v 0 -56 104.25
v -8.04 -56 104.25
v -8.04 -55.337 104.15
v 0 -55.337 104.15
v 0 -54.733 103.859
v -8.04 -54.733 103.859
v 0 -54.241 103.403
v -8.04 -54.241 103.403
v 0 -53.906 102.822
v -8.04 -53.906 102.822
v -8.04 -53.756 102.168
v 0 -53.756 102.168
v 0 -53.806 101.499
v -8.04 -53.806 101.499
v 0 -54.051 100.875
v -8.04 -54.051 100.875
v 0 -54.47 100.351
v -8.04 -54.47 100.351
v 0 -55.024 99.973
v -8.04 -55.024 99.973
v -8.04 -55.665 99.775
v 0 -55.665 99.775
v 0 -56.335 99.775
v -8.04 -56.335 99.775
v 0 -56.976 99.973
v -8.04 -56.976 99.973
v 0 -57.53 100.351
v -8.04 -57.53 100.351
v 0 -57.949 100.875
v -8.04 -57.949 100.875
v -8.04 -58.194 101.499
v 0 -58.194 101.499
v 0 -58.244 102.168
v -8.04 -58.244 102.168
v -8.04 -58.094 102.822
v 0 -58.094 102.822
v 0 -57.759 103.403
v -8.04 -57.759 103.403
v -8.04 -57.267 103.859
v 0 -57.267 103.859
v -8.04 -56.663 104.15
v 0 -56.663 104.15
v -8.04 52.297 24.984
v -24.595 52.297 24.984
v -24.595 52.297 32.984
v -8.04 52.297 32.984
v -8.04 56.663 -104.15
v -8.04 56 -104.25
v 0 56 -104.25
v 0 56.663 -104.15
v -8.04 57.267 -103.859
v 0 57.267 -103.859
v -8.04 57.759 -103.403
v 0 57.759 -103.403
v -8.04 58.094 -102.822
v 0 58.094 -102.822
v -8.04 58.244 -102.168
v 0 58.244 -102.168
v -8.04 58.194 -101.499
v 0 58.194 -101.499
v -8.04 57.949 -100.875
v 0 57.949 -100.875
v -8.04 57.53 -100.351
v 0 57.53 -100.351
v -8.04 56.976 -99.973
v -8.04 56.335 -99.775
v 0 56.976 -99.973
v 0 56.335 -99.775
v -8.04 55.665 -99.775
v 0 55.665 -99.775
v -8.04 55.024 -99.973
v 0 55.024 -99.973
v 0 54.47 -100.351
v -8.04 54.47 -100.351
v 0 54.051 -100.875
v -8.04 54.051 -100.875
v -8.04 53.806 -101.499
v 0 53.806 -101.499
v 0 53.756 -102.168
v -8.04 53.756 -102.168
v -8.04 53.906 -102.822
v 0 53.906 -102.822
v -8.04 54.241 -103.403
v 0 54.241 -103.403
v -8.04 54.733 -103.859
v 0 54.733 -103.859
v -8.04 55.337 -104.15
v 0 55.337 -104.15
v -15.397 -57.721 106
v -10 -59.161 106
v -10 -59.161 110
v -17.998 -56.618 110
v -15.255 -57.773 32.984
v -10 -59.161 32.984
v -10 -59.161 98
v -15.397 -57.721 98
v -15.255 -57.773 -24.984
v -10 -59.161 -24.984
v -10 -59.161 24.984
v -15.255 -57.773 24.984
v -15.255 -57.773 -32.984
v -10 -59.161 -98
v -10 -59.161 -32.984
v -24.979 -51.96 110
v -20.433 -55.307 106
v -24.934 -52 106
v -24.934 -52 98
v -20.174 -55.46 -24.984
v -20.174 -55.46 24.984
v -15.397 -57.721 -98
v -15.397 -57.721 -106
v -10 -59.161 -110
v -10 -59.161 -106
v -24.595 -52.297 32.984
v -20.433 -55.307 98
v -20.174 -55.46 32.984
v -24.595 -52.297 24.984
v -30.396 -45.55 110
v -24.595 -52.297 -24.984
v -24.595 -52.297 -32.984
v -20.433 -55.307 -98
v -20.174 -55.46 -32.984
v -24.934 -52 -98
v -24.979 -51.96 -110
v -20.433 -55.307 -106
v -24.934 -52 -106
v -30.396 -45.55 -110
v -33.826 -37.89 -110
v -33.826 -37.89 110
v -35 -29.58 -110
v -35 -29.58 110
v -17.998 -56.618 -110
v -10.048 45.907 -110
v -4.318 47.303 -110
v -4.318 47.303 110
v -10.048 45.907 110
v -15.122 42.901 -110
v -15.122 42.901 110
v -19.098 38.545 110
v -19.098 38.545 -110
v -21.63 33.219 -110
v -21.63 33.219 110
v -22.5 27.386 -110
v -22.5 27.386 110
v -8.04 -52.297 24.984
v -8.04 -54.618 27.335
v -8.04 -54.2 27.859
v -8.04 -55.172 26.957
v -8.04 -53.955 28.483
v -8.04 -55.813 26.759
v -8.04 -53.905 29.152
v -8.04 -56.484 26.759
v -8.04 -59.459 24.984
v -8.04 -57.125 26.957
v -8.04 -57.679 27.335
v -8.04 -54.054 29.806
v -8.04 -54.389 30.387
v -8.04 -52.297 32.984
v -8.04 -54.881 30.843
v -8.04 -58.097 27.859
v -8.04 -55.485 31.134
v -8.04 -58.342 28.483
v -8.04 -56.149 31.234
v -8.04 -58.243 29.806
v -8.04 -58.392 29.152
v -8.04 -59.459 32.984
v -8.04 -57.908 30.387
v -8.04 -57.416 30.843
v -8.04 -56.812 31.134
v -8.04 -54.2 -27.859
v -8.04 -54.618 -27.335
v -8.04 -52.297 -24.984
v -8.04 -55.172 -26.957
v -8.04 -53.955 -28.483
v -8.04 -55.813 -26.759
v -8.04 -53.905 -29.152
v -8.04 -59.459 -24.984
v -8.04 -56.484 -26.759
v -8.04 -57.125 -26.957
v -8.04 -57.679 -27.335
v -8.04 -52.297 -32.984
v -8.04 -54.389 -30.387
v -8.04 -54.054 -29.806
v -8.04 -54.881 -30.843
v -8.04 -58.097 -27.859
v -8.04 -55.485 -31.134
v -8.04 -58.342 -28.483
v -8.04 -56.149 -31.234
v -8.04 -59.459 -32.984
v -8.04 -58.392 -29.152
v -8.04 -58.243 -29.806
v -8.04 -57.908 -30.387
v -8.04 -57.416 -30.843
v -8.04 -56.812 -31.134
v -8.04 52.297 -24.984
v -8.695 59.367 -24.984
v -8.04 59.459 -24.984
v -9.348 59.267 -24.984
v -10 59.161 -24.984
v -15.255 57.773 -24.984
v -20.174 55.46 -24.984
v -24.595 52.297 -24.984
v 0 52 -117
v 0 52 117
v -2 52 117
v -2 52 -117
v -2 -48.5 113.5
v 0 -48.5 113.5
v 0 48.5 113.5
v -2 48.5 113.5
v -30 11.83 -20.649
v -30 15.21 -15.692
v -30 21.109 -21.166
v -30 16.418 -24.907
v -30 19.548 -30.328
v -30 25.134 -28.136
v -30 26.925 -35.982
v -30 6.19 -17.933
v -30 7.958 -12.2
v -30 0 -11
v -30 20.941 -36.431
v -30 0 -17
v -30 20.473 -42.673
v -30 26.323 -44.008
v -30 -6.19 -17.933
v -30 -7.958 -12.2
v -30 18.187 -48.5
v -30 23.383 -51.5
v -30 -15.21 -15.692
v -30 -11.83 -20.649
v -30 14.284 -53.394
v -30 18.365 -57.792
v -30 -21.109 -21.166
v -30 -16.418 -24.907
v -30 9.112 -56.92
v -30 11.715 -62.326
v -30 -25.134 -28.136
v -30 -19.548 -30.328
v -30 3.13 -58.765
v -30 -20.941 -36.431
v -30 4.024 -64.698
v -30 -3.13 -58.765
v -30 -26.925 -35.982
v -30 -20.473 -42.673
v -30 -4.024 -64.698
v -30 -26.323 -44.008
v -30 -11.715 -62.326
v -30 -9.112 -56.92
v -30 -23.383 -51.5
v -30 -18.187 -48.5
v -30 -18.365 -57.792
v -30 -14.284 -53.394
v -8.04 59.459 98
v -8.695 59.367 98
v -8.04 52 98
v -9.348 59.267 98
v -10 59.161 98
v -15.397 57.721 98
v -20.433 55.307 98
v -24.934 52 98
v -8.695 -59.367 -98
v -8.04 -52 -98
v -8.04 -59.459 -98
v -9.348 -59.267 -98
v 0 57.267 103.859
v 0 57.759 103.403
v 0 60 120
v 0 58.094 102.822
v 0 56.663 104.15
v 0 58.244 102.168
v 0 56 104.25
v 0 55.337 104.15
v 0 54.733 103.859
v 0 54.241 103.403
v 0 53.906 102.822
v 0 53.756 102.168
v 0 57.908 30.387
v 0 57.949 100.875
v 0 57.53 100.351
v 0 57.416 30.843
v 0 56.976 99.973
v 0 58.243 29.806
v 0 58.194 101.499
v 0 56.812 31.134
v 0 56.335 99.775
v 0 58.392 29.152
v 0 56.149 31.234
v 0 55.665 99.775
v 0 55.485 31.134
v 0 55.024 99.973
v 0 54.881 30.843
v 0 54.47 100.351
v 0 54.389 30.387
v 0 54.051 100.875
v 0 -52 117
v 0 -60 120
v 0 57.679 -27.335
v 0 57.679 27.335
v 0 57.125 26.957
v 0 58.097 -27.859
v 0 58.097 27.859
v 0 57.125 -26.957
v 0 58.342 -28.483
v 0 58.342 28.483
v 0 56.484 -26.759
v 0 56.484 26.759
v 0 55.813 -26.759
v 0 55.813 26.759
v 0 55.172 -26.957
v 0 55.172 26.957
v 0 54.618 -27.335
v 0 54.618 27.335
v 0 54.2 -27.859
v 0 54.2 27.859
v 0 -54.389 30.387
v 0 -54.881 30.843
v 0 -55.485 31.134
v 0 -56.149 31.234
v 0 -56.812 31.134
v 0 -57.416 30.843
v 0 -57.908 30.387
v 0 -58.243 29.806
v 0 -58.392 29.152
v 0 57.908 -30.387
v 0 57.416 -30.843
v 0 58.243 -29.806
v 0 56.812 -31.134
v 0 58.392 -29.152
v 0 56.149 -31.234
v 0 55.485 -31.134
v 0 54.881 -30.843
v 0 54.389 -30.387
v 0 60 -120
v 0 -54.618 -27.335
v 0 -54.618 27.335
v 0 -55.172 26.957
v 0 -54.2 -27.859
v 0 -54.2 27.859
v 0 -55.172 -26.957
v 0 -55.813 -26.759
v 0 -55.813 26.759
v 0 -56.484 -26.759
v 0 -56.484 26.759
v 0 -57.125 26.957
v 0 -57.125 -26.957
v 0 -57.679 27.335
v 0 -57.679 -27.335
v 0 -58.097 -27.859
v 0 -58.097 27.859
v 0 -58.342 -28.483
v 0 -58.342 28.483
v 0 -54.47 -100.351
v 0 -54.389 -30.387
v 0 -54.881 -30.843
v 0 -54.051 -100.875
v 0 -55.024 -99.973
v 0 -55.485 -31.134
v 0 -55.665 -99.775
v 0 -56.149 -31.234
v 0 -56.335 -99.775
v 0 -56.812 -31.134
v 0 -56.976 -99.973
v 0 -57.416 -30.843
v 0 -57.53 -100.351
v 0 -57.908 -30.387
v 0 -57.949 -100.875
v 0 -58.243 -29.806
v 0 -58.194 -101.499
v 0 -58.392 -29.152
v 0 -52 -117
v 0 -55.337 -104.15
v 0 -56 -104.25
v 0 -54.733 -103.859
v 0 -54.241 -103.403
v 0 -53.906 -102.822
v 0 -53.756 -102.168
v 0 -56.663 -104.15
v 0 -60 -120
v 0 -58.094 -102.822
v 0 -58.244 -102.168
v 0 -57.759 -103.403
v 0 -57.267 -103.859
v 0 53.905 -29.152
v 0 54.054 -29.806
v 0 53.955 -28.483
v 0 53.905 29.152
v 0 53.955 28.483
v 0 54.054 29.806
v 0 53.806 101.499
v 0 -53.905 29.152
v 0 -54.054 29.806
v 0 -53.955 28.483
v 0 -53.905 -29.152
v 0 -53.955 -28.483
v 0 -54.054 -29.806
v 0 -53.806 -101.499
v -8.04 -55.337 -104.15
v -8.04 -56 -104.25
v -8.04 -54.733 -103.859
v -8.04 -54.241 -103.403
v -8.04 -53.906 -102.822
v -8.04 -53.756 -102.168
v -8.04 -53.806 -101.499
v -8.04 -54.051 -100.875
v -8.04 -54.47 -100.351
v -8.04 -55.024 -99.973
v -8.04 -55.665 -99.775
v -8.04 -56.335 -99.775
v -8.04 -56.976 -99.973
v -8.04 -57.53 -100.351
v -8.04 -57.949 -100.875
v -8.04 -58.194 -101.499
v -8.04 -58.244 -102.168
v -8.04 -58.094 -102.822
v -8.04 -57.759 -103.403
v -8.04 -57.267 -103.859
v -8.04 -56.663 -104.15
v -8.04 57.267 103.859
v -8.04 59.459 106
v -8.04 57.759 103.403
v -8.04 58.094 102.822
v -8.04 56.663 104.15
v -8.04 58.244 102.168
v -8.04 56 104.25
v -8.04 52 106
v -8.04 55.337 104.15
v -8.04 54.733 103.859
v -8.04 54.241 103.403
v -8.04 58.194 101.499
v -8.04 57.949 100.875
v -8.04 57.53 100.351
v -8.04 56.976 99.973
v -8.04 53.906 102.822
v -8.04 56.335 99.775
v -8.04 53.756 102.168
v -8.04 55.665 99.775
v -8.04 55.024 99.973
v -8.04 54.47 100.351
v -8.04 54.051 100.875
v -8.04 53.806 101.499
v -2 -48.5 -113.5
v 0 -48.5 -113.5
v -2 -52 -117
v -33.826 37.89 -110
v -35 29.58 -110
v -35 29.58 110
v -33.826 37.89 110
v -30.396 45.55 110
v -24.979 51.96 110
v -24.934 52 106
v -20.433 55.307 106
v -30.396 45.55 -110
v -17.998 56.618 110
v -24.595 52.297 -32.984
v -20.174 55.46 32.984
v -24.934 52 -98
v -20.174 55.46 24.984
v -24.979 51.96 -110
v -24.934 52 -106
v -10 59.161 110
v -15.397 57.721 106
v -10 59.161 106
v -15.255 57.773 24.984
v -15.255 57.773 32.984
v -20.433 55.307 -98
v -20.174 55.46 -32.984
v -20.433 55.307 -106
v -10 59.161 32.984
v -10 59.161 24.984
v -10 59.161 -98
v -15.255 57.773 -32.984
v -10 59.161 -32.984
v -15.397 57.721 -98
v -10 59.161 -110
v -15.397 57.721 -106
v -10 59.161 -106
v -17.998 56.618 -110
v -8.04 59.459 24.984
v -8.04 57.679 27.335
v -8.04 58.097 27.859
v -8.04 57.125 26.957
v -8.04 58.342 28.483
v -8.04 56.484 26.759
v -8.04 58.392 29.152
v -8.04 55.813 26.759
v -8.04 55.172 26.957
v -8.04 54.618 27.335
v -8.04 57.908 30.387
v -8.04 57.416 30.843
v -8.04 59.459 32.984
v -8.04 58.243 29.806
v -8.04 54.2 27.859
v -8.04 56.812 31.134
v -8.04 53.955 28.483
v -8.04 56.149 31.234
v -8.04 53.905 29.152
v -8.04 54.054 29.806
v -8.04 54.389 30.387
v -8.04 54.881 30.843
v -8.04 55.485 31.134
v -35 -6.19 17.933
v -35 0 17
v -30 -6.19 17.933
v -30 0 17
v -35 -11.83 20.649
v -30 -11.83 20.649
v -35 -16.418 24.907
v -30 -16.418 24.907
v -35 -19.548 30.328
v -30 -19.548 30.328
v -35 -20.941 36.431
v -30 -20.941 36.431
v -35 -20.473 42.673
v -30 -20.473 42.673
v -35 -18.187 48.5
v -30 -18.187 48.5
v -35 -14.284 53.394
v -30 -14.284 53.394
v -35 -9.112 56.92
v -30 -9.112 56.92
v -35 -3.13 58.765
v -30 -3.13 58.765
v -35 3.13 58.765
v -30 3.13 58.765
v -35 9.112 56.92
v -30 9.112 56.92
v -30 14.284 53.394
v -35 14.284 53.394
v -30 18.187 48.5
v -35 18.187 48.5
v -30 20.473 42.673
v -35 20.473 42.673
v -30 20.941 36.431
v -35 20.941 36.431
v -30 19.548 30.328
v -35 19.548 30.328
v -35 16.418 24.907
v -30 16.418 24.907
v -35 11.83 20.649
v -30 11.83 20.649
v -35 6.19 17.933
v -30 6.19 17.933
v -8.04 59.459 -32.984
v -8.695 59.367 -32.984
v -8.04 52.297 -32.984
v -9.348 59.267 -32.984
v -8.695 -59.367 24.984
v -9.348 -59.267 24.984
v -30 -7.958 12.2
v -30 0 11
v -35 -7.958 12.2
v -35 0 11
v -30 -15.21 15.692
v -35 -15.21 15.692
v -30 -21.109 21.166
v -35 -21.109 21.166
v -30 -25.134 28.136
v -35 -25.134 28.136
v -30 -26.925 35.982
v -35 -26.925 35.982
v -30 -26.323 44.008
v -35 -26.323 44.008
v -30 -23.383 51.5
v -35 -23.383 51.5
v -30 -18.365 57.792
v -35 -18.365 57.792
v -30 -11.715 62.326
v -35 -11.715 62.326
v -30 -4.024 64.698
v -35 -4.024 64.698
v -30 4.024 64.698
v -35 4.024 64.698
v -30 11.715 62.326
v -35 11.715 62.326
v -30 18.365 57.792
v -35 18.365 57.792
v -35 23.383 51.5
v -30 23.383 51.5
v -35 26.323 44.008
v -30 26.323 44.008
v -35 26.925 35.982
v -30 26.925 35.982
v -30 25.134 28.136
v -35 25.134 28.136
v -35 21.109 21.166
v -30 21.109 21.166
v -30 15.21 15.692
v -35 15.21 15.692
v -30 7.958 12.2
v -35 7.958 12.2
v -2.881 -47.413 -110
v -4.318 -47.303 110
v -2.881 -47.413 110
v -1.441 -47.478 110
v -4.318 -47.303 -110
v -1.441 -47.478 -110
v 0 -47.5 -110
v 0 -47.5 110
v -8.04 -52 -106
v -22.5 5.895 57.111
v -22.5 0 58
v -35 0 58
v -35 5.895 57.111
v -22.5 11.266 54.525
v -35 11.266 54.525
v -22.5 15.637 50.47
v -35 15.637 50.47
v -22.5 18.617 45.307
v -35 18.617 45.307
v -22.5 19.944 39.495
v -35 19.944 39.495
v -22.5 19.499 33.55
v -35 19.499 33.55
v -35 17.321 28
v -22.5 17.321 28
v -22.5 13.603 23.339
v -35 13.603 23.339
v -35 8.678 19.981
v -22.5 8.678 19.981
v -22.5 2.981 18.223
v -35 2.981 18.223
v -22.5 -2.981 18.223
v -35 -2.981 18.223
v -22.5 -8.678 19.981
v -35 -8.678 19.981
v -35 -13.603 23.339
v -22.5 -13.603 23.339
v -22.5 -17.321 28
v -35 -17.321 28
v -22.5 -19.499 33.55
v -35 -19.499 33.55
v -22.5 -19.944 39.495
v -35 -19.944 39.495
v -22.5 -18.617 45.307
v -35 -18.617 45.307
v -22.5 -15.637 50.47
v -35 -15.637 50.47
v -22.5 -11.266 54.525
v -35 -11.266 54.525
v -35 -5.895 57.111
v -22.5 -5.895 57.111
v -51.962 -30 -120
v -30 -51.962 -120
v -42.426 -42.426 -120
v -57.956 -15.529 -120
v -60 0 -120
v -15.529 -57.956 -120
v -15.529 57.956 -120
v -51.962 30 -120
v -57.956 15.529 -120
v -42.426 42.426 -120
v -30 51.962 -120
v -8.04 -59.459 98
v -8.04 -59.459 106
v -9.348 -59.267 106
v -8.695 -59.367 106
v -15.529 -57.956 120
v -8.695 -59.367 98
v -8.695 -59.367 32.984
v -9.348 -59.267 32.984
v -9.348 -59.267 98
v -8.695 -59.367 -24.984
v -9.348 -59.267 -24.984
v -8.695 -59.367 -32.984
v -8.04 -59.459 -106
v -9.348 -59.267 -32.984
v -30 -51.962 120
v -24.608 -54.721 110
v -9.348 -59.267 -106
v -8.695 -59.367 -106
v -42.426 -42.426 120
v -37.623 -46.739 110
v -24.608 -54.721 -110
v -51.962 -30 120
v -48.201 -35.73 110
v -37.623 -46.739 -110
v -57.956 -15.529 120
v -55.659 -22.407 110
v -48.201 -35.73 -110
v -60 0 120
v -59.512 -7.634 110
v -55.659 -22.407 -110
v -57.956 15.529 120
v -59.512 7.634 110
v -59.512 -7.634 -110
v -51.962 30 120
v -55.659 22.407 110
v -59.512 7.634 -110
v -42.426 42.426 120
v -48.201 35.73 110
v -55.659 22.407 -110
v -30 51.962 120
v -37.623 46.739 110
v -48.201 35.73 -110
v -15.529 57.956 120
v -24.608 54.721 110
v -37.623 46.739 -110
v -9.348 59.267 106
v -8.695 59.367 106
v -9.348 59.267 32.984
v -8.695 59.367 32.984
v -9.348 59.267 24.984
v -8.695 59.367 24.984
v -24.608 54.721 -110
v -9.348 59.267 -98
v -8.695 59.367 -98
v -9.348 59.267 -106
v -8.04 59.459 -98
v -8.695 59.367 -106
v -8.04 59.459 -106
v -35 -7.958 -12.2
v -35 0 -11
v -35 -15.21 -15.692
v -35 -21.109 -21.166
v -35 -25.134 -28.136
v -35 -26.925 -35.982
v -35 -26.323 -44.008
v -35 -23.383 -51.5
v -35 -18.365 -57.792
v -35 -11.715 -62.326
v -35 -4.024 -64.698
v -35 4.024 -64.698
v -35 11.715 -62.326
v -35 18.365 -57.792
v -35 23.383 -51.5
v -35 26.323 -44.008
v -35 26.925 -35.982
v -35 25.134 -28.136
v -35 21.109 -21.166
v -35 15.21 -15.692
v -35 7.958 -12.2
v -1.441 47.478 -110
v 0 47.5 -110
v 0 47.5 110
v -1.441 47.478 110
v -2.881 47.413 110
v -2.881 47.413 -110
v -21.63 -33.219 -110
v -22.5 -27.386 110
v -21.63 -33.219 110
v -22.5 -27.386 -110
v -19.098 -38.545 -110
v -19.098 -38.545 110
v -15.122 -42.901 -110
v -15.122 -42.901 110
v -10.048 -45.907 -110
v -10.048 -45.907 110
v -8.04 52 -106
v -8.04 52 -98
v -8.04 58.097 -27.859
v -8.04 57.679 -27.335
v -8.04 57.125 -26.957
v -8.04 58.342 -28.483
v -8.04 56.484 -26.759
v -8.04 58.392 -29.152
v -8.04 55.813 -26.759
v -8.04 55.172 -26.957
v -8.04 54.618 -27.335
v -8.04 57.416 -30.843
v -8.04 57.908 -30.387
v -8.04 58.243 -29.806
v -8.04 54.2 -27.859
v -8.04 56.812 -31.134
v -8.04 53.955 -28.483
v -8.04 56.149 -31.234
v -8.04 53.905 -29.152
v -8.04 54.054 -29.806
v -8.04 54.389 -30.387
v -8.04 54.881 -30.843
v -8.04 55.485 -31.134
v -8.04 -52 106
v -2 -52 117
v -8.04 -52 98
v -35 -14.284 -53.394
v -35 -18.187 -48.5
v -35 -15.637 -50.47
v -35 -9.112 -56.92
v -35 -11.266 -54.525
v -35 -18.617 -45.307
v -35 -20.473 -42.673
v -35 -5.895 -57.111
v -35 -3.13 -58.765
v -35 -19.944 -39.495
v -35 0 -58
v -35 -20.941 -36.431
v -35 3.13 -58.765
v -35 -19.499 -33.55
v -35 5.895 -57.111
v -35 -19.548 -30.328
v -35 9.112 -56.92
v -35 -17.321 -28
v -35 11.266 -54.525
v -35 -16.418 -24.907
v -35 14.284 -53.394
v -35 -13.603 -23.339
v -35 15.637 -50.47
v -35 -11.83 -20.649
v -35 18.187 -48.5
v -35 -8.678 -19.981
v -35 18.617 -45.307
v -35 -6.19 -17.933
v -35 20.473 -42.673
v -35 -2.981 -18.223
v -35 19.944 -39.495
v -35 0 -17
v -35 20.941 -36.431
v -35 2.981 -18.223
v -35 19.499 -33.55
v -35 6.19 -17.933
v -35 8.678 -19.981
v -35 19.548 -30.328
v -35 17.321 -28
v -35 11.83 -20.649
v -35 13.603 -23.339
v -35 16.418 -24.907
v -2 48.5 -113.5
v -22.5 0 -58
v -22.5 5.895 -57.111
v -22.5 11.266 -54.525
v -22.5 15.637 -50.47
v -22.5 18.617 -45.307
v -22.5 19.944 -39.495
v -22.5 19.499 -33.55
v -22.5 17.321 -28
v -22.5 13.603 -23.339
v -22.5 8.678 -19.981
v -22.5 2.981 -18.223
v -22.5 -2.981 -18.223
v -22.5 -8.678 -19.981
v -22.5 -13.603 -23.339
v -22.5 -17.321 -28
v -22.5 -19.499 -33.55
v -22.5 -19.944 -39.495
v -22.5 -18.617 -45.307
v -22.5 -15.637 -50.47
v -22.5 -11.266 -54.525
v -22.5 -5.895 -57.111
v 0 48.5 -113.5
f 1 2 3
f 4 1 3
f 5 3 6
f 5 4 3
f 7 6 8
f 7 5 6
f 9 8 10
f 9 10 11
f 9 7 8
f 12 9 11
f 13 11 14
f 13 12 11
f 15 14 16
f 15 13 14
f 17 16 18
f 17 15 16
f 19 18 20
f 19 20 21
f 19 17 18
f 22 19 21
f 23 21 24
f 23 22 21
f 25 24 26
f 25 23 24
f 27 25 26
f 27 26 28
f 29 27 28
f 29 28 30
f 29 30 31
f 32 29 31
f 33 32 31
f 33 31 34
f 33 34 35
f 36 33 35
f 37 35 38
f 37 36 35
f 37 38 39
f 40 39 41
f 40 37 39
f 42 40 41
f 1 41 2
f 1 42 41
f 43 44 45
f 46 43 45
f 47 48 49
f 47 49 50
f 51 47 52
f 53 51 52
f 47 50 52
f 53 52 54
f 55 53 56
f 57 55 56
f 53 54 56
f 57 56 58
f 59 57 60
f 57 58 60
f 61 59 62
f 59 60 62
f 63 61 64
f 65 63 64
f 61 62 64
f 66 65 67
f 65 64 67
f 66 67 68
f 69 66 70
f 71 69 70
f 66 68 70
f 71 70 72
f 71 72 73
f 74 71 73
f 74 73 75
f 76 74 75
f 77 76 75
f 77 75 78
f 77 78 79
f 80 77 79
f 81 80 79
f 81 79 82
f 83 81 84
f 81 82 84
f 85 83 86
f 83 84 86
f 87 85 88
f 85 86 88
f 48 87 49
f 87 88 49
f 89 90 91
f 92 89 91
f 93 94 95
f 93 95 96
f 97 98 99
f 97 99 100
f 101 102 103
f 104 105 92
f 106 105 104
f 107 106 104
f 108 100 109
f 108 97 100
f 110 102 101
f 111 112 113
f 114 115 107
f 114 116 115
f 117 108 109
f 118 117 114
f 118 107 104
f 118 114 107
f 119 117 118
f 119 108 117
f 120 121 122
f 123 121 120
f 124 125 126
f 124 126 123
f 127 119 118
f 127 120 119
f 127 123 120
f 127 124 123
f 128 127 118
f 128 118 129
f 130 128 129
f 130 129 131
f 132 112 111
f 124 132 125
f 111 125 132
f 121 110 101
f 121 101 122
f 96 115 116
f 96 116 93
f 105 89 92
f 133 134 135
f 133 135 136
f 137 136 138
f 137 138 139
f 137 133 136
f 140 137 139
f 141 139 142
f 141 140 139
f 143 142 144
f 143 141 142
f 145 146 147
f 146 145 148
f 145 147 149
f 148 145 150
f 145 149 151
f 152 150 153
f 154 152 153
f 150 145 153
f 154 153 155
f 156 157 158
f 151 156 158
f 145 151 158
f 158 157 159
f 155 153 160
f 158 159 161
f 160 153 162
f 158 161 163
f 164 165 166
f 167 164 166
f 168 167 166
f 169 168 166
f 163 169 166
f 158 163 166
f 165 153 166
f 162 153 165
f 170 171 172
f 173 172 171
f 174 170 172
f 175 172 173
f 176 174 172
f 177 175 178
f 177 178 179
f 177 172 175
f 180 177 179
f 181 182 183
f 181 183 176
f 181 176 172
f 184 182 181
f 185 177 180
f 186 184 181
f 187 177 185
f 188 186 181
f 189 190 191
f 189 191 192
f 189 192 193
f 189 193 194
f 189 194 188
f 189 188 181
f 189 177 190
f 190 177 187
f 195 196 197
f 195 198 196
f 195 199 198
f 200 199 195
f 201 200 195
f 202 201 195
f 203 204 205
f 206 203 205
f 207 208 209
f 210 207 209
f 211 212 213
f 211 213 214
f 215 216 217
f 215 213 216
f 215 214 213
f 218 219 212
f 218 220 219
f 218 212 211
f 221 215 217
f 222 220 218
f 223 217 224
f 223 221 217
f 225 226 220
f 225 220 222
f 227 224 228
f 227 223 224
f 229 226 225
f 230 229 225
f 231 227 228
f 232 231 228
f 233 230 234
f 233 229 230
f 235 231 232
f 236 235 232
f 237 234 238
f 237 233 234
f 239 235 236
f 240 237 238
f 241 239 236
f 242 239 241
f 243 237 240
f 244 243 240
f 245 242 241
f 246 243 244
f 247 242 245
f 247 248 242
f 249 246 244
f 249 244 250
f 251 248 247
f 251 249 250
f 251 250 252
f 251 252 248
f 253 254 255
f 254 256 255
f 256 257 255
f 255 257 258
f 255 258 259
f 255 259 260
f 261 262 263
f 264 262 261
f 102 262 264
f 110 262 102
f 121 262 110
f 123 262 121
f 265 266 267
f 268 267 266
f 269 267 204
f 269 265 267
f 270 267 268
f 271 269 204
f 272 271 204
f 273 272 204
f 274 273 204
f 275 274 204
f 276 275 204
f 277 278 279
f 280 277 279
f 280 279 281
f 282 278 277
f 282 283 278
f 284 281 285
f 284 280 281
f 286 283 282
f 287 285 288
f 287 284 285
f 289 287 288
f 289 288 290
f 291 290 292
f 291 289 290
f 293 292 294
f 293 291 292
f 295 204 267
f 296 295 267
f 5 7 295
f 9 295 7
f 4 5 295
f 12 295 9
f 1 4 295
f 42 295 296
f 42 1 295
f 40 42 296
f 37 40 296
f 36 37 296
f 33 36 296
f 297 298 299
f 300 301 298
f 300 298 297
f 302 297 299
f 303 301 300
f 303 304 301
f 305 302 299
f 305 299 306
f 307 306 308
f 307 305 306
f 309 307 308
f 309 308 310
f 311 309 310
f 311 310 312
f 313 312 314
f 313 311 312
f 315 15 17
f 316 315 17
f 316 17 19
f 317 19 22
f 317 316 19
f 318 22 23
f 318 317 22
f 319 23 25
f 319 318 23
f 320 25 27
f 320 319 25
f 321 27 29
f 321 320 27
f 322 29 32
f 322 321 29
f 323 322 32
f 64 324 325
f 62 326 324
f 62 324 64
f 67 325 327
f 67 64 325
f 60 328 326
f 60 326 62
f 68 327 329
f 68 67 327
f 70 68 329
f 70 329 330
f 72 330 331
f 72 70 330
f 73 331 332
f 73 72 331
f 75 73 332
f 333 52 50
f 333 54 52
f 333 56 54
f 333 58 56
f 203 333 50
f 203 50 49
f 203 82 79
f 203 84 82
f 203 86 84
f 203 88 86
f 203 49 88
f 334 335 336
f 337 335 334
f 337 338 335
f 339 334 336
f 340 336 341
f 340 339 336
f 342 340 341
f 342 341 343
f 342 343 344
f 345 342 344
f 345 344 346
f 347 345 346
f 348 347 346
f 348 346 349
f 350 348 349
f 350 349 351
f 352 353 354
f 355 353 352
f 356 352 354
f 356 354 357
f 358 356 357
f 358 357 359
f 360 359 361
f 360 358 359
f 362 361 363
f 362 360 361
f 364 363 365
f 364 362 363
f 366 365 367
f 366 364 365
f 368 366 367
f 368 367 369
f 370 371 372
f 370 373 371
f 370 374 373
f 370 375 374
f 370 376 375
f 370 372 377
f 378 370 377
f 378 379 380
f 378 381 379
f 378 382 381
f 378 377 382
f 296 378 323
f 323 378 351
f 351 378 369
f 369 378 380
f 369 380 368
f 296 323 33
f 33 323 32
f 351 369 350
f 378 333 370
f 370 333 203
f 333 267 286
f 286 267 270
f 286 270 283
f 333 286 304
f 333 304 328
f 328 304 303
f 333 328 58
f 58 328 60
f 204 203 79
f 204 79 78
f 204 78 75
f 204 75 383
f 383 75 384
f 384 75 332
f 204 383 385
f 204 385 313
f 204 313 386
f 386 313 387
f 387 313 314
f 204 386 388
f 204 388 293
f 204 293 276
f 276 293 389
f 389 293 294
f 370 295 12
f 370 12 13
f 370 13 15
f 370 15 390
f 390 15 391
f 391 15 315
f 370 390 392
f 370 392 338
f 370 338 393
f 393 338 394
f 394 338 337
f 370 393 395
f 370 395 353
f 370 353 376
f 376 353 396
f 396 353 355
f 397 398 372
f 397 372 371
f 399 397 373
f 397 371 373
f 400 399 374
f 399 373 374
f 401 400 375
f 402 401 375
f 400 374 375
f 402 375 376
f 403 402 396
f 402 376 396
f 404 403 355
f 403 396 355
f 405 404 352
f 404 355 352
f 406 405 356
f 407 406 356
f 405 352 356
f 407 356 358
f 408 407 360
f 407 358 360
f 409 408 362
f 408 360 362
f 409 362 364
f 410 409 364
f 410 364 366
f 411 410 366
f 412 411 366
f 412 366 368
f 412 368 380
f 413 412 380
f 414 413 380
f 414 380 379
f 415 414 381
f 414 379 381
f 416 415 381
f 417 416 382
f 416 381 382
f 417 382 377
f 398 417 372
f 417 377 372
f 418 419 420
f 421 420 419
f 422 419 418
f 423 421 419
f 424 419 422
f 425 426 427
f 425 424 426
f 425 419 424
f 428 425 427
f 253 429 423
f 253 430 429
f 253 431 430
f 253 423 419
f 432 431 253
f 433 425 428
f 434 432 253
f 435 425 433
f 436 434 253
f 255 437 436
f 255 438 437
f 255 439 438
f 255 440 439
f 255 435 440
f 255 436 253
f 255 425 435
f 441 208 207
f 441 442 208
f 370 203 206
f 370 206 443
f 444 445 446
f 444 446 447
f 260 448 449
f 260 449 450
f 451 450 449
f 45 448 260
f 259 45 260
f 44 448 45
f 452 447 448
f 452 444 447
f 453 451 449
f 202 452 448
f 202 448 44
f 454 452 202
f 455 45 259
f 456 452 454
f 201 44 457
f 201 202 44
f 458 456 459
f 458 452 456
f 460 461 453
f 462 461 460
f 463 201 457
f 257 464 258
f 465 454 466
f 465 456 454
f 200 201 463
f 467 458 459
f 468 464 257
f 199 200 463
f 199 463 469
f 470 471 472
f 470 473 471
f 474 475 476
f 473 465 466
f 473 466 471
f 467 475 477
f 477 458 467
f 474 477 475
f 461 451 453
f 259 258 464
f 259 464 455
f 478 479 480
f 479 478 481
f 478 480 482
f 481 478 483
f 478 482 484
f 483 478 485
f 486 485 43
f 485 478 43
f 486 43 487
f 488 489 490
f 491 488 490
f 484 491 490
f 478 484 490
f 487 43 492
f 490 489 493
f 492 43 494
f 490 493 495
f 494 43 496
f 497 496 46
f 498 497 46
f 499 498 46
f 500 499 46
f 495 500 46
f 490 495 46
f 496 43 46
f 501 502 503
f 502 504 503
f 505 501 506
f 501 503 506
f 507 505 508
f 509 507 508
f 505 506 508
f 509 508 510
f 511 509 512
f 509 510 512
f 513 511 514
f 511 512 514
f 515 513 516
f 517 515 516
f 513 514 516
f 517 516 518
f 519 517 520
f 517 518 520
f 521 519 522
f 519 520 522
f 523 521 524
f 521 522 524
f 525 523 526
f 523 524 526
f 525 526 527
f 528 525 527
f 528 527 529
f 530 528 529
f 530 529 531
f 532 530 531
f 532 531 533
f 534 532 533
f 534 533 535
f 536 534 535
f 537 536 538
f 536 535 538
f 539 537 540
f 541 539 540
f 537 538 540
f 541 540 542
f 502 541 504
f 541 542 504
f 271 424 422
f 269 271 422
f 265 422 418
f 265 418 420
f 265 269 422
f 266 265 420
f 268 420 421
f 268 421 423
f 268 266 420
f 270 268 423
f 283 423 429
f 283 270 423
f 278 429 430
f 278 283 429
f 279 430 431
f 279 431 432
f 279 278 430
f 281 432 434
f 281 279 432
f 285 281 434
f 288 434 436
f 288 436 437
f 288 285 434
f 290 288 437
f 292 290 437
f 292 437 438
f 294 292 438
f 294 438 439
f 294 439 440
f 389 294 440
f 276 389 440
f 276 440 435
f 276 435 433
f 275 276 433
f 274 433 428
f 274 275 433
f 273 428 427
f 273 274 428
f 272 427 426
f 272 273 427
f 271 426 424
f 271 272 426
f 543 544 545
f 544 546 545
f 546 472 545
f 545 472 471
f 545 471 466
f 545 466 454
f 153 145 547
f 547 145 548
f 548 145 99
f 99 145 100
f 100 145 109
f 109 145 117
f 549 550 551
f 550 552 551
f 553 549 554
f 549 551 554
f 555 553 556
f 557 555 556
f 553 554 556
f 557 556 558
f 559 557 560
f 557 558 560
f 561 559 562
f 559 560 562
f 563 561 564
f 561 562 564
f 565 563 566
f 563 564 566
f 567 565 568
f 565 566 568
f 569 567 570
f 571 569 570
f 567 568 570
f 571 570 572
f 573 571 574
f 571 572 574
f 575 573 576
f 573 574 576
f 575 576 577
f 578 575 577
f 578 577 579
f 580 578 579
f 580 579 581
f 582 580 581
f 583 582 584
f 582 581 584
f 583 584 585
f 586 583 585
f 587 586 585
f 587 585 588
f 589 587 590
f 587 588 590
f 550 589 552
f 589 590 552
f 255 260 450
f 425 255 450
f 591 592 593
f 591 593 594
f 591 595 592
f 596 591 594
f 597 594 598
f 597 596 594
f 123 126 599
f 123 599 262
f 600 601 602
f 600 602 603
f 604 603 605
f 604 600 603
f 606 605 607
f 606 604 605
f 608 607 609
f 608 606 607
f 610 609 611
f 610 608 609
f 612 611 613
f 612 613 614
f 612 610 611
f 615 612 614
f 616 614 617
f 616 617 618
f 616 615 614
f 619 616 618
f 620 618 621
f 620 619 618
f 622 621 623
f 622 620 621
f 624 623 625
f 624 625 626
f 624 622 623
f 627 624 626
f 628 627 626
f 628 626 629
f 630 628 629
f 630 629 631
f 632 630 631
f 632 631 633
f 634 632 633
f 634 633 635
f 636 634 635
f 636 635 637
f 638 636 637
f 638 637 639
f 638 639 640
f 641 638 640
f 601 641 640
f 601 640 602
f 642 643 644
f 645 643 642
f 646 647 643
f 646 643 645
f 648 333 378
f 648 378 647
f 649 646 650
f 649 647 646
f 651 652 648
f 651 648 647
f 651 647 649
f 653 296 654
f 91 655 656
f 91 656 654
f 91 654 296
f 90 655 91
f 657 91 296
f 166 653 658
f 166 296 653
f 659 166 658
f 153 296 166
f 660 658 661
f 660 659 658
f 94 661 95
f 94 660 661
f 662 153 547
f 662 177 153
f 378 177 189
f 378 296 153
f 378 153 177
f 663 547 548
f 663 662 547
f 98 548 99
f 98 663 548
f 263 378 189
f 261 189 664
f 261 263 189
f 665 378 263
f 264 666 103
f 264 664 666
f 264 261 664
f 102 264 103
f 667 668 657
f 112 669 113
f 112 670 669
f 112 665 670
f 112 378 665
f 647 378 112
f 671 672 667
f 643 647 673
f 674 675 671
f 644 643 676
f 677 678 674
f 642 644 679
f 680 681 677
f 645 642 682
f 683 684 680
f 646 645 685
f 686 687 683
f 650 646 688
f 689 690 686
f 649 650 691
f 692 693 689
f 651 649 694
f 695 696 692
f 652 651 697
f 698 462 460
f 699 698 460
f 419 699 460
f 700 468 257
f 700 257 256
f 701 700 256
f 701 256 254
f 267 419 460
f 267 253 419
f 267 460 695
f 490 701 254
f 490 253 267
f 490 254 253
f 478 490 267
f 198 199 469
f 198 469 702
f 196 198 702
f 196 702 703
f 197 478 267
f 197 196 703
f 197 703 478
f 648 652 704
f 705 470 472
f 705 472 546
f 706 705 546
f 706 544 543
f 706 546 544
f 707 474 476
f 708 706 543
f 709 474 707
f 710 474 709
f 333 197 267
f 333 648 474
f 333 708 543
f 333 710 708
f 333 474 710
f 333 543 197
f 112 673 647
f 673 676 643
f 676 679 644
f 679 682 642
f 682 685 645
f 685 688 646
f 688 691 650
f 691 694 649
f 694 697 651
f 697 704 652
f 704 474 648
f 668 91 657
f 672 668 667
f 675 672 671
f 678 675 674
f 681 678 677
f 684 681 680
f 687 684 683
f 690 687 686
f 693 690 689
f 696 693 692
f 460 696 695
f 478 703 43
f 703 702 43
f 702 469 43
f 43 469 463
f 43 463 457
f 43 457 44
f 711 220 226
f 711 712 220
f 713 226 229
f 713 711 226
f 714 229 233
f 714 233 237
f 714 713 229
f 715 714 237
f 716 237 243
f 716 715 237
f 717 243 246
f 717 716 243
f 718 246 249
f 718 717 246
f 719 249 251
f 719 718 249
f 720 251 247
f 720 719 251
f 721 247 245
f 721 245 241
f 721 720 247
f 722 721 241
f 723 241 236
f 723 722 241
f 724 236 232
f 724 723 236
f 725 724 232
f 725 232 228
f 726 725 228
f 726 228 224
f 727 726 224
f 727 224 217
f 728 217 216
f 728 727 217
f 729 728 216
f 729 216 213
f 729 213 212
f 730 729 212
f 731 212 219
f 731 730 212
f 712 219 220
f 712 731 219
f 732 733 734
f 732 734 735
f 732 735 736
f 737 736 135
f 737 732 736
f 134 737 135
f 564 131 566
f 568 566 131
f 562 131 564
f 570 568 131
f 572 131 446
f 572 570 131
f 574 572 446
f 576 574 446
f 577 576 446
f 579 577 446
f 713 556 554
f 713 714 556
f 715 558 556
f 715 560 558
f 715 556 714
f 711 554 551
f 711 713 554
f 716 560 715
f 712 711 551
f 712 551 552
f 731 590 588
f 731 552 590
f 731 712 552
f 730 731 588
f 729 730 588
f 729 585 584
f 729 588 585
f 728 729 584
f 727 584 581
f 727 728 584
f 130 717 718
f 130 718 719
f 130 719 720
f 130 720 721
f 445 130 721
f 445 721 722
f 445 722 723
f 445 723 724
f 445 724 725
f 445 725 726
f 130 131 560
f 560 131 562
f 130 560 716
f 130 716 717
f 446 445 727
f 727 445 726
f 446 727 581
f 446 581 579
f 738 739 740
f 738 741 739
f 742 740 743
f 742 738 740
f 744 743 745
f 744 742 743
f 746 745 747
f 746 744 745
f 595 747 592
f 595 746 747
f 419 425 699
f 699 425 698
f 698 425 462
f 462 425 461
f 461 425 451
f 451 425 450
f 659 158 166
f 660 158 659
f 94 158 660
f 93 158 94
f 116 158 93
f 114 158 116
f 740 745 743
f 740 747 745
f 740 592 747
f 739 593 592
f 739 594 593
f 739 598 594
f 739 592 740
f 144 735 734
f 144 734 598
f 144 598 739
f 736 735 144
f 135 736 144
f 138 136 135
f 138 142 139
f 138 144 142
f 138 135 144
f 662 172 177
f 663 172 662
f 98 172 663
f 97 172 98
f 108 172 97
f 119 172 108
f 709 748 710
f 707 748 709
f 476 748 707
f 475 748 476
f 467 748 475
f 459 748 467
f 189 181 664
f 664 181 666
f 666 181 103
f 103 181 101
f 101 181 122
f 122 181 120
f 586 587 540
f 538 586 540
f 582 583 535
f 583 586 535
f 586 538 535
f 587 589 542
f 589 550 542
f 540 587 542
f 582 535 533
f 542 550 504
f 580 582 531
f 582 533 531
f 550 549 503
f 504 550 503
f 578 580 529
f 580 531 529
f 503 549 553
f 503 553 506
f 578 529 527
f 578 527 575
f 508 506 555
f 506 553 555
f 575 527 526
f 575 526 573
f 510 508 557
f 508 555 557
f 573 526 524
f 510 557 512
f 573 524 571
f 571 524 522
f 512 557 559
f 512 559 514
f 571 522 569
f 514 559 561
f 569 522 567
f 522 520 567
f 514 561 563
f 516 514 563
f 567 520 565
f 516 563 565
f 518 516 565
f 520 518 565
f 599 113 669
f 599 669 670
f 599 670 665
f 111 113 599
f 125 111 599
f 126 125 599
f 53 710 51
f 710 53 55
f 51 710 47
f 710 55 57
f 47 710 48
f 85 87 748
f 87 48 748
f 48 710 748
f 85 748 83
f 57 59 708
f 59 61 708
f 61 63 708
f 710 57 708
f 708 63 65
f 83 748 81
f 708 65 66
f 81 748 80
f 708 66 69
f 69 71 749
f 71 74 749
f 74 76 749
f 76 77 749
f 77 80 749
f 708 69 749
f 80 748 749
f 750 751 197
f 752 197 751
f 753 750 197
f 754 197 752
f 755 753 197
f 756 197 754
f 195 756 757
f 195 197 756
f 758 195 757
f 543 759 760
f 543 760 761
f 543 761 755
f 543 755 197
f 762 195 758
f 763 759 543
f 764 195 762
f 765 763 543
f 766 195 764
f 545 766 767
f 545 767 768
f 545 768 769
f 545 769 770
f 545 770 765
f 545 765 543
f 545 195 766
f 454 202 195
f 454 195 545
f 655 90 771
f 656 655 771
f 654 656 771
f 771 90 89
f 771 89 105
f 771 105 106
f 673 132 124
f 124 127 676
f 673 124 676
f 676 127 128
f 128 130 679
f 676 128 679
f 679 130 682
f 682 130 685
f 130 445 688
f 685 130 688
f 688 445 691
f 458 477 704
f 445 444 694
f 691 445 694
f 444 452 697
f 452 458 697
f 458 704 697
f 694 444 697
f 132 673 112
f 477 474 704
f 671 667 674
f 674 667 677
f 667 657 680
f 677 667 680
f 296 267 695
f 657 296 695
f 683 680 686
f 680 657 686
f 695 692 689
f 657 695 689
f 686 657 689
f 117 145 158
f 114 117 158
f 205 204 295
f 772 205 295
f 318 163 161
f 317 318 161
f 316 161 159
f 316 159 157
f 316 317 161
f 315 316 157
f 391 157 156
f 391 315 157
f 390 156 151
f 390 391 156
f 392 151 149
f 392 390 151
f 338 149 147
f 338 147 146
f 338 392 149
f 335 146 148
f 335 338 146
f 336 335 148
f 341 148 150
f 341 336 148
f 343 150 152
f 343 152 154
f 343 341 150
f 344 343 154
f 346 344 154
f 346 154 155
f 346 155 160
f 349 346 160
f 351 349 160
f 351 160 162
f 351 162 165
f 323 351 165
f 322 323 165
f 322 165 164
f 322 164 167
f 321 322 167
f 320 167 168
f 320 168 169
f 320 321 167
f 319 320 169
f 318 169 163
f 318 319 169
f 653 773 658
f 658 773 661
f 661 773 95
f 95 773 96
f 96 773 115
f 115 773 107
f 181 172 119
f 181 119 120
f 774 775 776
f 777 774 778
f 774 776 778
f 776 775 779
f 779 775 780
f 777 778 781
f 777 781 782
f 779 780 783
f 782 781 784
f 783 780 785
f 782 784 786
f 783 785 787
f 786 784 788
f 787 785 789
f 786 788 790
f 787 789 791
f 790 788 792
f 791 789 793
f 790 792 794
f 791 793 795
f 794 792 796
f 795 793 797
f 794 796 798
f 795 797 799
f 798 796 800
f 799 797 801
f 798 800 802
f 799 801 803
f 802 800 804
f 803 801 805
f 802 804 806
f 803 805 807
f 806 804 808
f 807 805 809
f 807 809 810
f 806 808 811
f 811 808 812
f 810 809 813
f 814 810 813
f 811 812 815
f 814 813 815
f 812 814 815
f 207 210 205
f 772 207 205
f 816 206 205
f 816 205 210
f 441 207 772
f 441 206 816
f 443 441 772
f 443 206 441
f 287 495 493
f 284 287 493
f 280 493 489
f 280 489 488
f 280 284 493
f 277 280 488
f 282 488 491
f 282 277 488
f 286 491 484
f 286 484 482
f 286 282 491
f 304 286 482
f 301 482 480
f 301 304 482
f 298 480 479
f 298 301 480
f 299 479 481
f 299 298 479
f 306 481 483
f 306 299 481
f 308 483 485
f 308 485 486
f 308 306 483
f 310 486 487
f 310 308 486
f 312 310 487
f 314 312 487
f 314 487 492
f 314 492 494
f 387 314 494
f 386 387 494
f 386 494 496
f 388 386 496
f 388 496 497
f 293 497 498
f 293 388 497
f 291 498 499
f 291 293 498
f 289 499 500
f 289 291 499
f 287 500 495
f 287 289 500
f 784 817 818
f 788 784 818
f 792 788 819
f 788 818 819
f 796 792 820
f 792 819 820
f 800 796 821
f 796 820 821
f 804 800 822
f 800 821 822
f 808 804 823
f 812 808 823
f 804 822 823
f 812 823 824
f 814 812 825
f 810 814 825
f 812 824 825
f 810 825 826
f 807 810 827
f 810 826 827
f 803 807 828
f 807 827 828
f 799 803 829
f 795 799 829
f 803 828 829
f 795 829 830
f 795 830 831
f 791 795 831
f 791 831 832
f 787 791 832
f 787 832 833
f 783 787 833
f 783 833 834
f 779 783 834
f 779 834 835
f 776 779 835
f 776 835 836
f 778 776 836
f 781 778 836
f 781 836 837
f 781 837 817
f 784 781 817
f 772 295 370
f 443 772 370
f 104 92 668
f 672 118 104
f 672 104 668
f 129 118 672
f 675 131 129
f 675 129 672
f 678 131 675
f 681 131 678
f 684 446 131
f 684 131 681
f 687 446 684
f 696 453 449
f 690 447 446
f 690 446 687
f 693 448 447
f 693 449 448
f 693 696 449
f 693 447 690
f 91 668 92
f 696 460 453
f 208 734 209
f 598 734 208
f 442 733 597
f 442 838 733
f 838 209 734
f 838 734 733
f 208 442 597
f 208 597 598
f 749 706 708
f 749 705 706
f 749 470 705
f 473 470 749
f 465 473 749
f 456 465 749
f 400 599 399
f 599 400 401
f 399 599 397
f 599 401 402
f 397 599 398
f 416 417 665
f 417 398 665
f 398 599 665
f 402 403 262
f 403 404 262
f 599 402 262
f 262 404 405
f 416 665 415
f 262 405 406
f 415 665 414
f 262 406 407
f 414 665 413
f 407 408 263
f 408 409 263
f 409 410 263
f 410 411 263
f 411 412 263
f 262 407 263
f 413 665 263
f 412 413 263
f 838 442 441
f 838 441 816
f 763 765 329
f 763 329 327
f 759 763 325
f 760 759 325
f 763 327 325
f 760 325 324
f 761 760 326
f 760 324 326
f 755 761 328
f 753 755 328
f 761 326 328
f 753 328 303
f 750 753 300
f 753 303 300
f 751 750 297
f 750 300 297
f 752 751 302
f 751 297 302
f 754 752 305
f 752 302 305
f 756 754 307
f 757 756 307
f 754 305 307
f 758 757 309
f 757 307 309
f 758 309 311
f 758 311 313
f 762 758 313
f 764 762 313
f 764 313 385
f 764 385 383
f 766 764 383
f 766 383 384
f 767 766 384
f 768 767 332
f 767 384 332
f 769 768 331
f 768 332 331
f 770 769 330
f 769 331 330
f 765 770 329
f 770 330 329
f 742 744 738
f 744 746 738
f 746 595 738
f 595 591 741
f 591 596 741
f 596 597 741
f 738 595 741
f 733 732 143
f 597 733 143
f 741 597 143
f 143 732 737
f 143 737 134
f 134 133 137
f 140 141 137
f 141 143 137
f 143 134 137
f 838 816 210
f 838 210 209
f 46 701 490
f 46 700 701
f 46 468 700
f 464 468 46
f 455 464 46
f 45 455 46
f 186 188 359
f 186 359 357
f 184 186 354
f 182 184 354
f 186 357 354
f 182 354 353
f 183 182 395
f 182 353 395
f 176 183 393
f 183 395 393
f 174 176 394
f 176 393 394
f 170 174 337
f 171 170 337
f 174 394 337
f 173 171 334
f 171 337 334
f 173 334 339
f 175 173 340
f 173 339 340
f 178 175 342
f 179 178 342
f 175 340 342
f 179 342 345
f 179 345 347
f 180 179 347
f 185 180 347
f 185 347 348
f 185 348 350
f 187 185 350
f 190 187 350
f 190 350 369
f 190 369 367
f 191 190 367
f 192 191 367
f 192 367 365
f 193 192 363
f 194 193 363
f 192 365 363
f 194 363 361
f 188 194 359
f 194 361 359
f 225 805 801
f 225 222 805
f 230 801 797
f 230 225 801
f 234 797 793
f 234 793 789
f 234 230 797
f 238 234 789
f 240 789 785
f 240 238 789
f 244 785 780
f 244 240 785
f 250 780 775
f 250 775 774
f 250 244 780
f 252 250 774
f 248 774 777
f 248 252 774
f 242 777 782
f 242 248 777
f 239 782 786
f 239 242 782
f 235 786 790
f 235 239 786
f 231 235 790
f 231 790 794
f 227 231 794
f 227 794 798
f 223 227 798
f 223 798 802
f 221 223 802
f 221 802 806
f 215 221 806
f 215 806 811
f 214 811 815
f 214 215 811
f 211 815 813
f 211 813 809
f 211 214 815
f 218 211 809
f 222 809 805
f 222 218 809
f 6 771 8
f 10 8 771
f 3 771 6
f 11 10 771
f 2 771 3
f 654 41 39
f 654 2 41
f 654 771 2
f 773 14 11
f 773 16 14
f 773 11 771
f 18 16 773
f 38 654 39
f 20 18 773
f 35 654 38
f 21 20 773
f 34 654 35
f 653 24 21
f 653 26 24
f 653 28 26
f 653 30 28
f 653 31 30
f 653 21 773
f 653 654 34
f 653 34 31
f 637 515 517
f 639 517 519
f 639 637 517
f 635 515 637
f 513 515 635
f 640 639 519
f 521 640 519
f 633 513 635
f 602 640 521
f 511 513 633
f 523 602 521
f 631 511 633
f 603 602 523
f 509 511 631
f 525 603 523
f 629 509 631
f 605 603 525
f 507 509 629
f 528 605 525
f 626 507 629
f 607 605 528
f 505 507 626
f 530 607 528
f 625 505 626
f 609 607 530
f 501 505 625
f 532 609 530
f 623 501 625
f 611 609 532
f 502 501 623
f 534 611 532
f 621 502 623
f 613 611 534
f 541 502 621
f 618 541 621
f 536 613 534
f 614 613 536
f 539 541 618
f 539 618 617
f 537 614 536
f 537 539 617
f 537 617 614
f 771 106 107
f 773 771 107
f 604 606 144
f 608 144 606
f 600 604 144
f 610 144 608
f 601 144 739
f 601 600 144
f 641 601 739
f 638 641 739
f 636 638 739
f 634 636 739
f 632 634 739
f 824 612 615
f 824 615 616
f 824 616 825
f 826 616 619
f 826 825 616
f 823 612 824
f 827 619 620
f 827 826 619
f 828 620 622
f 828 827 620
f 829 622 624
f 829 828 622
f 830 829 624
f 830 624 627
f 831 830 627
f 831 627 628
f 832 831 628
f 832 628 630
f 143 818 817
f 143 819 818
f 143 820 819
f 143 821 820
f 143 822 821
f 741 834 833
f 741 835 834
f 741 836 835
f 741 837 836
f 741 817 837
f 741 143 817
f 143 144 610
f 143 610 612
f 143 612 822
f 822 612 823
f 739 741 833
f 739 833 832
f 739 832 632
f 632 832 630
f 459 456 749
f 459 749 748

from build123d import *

# Parameters (mm, degrees)
BOSS_EXTRUDE1_DEPTH            = 110
BOSS_EXTRUDE3_START            = -110
BOSS_EXTRUDE3_DEPTH            = 10
SKETCH11_W                     = 8
SKETCH11_H                     = 7.702958
SKETCH11_H_2                   = 8
CUT_EXTRUDE1_DEPTH             = 51
M4_CLEARANCE_HOLE1_D           = 4.5
M4_CLEARANCE_HOLE1_CSINK_D     = 4.55
M4_CLEARANCE_HOLE1_CSINK_ANGLE = 90
CUT_EXTRUDE2_START             = -20
SKETCH14_R                     = 20
CUT_EXTRUDE2_DEPTH             = 48
CUT_EXTRUDE3_DEPTH             = 2
SKETCH22_W                     = 5
SKETCH22_H                     = 6


with BuildPart() as part:
    # Sketch1 → Boss-Extrude1 (new body)
    with BuildSketch(Plane.XY):
        with BuildLine():
            Line((0, 52), (-2, 52))
            Line((-2, 52), (-2, 48.5))
            Line((-2, 48.5), (0, 48.5))
            Line((0, 48.5), (0, 47.5))
            ThreePointArc((0, 47.5), (-2.161329, 47.450802), (-4.318182, 47.303312))
            ThreePointArc((-4.318182, 47.303312), (-17.270979, 40.870125), (-22.5, 27.386128))
            Line((-22.5, 27.386128), (-22.5, -27.386128))
            ThreePointArc((-22.5, -27.386128), (-17.270979, -40.870125), (-4.318182, -47.303312))
            ThreePointArc((-4.318182, -47.303312), (-2.161329, -47.450802), (0, -47.5))
            Line((0, -47.5), (0, -48.5))
            Line((0, -48.5), (-2, -48.5))
            Line((-2, -48.5), (-2, -52))
            Line((-2, -52), (0, -52))
            Line((0, -52), (0, -60))
            ThreePointArc((0, -60), (-5.017576, -59.789831), (-10, -59.160798))
            ThreePointArc((-10, -59.160798), (-27.912878, -48.945316), (-35, -29.580399))
            Line((-35, -29.580399), (-35, 29.580399))
            ThreePointArc((-35, 29.580399), (-27.912878, 48.945316), (-10, 59.160798))
            ThreePointArc((-10, 59.160798), (-5.017576, 59.789831), (0, 60))
            Line((0, 60), (0, 52))
        make_face()
    boss_extrude1 = extrude(amount=-BOSS_EXTRUDE1_DEPTH)

    # Sketch7 → Boss-Extrude3 (add)
    with BuildSketch(Plane.XY.offset(BOSS_EXTRUDE3_START)):
        with BuildLine():
            Line((0, 60), (0, -60))
            ThreePointArc((0, -60), (-60, 0), (0, 60))
        make_face()
    boss_extrude3 = extrude(amount=-BOSS_EXTRUDE3_DEPTH)

    # Sketch11 → Cut-Extrude1 (cut)
    with BuildSketch(Plane(origin=(-59.040249, 0, 0), x_dir=(0, 0, -1), z_dir=(-1, 0, 0))):
        with Locations((28.984104, 56.148521)):
            Rectangle(SKETCH11_W, SKETCH11_H)
        with Locations((102, 56)):
            Rectangle(SKETCH11_W, SKETCH11_H_2)
        with Locations((28.984104, -56.148521)):
            Rectangle(SKETCH11_W, SKETCH11_H)
        with Locations((102, -56)):
            Rectangle(SKETCH11_W, SKETCH11_H_2)
    cut_extrude1 = extrude(amount=-CUT_EXTRUDE1_DEPTH, mode=Mode.SUBTRACT)

    # M4 Clearance Hole1 (through all)
    with Locations(Plane.ZY.offset(35)):
        with Locations((-28.984104, -56.148521), (-102, 56), (-28.984104, 56.148521), (-102, -56)):
            m4_clearance_hole1 = CounterSinkHole(M4_CLEARANCE_HOLE1_D / 2, M4_CLEARANCE_HOLE1_CSINK_D / 2, counter_sink_angle=M4_CLEARANCE_HOLE1_CSINK_ANGLE)

    # Sketch14 → Cut-Extrude2 (cut)
    with BuildSketch(Plane(origin=(0, 0, 0), x_dir=(0, 0, -1), z_dir=(1, 0, 0)).offset(CUT_EXTRUDE2_START)):
        with Locations((38, 0)):
            Circle(SKETCH14_R)
    cut_extrude2 = extrude(amount=-CUT_EXTRUDE2_DEPTH, mode=Mode.SUBTRACT)

    # Sketch8 → Cut-Extrude3 (cut)
    with BuildSketch(Plane(origin=(0, 0, 0), x_dir=(0, 0, -1), z_dir=(1, 0, 0))):
        Polygon((117, 52), (117, -52), (110, -52), (110, -48.5), (113.5, -48.5), (113.5, 48.5), (110, 48.5), (110, 52), align=None)
    cut_extrude3 = extrude(amount=-CUT_EXTRUDE3_DEPTH, mode=Mode.SUBTRACT)

    # Sketch22 → Cut-Revolve4 (revolve, cut)
    with BuildSketch(Plane.XY.offset(-38)):
        with Locations((-32.5, -24)):
            Rectangle(SKETCH22_W, SKETCH22_H)
    cut_revolve4 = revolve(axis=Axis((-1035, 0, -38), (1, 0, 0)), mode=Mode.SUBTRACT)

    # Mirror3: Boss-Extrude1, Boss-Extrude3, Cut-Extrude1, M4 Clearance Hole1, Cut-Extrude2, Cut-Extrude3, Cut-Revolve4 across plane
    add(boss_extrude1.mirror(Plane.XY))
    add(boss_extrude3.mirror(Plane.XY))
    add(cut_extrude1.mirror(Plane.XY), mode=Mode.SUBTRACT)
    add(m4_clearance_hole1.mirror(Plane.XY), mode=Mode.SUBTRACT)
    add(cut_extrude2.mirror(Plane.XY), mode=Mode.SUBTRACT)
    add(cut_extrude3.mirror(Plane.XY), mode=Mode.SUBTRACT)
    add(cut_revolve4.mirror(Plane.XY), mode=Mode.SUBTRACT)


solid = part.part
